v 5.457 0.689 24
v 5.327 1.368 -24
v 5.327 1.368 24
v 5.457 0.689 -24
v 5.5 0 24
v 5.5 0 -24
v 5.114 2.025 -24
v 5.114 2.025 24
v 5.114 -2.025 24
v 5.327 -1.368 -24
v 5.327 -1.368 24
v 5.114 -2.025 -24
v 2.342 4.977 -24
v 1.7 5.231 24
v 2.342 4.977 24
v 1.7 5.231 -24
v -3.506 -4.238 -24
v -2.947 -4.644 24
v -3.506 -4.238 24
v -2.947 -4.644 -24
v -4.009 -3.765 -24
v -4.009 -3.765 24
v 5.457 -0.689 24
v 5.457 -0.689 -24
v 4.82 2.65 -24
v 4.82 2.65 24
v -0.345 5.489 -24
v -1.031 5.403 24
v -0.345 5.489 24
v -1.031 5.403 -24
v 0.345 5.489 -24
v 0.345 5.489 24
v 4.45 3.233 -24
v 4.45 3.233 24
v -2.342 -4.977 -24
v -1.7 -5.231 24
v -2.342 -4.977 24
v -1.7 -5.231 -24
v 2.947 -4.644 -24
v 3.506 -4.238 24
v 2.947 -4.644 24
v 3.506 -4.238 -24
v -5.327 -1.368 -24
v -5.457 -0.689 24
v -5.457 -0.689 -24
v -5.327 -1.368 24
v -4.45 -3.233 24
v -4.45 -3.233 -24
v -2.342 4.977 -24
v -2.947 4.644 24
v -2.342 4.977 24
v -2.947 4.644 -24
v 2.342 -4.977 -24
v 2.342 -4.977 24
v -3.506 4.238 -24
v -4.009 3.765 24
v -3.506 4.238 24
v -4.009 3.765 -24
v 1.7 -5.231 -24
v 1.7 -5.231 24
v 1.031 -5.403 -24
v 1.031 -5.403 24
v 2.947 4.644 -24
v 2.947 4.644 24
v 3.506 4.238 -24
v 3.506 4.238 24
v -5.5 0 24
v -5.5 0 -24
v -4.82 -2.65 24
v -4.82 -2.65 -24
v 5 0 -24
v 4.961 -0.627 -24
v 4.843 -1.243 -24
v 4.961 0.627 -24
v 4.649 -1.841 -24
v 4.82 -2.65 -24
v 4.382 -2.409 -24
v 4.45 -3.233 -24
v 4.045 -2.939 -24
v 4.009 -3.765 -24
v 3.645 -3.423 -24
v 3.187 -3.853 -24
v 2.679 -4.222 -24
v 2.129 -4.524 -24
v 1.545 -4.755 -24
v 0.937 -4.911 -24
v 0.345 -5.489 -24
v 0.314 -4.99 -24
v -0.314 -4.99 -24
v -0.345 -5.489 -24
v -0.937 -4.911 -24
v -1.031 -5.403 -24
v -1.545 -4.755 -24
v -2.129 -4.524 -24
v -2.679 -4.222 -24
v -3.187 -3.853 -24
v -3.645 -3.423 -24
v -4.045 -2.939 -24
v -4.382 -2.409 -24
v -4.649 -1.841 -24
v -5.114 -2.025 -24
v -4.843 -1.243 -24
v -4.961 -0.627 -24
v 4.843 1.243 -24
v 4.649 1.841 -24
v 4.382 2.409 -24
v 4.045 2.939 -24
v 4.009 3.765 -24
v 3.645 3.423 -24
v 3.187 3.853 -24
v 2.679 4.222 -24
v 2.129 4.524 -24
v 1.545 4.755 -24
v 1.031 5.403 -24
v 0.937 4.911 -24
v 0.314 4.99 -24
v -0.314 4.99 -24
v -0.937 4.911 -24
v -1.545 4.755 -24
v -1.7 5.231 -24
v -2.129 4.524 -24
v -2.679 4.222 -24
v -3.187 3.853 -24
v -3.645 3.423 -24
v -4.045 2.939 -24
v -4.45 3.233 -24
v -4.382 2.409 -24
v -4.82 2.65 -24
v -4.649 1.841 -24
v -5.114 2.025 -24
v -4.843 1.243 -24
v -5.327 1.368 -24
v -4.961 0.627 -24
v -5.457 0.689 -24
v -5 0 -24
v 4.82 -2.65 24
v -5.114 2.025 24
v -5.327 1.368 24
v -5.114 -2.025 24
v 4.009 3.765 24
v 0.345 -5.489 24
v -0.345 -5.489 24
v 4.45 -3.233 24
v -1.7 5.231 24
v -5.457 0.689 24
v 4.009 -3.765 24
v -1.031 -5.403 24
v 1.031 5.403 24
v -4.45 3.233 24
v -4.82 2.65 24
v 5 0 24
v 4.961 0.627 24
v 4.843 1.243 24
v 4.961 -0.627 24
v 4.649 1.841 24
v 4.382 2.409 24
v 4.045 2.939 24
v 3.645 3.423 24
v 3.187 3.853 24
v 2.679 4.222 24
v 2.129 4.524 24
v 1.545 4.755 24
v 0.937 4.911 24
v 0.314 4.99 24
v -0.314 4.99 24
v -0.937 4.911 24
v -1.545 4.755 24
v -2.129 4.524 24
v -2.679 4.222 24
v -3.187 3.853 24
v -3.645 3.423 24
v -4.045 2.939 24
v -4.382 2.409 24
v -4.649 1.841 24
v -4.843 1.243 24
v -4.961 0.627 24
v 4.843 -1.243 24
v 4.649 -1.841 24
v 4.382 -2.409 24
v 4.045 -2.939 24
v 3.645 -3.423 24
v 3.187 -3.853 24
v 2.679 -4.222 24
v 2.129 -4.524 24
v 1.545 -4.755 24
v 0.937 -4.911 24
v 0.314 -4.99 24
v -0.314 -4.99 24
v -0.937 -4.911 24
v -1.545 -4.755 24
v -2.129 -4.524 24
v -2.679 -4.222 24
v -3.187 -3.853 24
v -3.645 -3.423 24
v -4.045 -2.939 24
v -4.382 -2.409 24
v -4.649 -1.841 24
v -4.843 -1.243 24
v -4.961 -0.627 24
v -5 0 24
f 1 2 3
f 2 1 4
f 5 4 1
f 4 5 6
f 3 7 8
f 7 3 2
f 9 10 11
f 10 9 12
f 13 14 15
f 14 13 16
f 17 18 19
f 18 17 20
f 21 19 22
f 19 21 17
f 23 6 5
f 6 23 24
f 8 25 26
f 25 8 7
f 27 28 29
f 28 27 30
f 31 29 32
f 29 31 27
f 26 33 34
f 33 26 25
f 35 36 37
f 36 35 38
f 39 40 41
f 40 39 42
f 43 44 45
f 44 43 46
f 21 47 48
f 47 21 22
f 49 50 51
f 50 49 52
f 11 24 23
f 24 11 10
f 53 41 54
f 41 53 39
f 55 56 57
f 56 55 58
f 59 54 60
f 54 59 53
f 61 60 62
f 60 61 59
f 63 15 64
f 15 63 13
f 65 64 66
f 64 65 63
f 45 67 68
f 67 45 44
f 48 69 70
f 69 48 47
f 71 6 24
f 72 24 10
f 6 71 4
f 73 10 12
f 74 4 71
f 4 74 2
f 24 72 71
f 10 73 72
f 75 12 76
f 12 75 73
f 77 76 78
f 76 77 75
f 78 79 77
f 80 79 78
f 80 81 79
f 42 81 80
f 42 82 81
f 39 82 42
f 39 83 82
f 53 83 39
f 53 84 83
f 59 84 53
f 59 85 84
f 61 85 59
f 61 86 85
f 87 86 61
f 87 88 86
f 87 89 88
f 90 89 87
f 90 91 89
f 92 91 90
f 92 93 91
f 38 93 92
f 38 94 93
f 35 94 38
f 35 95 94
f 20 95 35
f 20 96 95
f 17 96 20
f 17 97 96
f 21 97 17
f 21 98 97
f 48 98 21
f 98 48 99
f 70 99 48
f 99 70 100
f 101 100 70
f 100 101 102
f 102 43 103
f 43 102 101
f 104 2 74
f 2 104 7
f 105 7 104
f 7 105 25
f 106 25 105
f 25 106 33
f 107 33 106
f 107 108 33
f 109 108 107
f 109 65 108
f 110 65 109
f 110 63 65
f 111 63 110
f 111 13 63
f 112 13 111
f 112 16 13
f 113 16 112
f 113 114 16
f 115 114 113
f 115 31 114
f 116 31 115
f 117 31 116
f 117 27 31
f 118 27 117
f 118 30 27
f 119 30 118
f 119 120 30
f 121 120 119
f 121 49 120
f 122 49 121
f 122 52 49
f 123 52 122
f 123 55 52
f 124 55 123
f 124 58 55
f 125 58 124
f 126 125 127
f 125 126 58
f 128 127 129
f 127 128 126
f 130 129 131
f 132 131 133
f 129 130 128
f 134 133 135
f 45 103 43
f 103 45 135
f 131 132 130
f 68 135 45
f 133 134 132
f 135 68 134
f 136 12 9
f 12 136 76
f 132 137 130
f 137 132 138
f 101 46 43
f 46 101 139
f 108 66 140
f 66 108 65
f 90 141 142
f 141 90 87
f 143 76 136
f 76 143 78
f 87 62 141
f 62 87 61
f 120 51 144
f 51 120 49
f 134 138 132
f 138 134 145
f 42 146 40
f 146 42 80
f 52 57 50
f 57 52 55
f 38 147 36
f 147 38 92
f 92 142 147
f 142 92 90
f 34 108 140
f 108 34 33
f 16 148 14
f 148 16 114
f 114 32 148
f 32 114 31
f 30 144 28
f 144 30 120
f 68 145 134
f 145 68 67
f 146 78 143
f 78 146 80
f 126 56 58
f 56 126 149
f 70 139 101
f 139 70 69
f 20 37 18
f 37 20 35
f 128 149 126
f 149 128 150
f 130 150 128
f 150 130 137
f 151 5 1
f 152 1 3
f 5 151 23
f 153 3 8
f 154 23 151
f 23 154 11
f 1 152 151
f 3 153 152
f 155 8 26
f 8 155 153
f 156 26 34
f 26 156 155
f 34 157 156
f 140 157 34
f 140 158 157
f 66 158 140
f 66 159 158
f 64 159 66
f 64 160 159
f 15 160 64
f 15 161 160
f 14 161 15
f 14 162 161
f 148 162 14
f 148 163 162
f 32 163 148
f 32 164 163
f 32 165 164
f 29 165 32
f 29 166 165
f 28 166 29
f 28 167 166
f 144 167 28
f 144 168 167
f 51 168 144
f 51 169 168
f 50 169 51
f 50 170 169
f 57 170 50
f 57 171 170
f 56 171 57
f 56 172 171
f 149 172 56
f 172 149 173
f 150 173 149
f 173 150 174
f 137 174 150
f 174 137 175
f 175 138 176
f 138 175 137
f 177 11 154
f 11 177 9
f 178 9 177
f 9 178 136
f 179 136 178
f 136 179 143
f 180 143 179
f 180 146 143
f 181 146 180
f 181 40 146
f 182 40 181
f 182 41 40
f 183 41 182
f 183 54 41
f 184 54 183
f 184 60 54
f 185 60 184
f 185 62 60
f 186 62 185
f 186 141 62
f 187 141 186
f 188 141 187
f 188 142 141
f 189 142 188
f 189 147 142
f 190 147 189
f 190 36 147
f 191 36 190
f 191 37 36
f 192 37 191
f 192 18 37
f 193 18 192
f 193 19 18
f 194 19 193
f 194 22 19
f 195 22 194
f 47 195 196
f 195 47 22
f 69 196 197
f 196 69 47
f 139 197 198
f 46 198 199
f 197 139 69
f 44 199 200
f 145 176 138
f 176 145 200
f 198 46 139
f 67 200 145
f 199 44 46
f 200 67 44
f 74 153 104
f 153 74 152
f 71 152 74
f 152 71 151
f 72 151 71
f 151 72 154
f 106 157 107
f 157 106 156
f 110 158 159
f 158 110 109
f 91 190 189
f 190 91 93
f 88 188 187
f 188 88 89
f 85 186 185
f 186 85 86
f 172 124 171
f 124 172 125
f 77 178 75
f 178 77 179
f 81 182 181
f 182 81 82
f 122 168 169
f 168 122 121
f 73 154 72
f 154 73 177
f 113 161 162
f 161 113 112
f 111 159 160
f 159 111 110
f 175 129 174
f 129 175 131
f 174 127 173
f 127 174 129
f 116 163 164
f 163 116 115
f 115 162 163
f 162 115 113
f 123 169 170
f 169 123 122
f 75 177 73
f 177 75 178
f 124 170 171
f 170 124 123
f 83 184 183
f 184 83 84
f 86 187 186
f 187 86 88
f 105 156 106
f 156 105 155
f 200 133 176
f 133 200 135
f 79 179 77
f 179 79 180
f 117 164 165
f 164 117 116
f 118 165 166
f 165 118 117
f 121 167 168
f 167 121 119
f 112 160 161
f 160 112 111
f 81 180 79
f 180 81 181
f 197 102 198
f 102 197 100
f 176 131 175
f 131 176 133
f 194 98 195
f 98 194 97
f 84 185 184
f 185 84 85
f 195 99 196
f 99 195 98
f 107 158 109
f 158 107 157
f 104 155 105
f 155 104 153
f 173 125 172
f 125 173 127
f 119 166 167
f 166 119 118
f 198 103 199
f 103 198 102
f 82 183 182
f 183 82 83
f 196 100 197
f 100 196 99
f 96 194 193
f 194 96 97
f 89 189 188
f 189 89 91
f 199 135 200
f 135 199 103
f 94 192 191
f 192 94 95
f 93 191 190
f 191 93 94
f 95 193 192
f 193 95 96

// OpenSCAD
$fn = 50;


difference() {
	union() {
		translate(v = [0, 0, -24.0000000000]) {
			cylinder(h = 48, r = 5.5000000000);
		}
	}
	union() {
		translate(v = [0, 0, -100.0000000000]) {
			cylinder(h = 200, r = 5.0000000000);
		}
	}
}
